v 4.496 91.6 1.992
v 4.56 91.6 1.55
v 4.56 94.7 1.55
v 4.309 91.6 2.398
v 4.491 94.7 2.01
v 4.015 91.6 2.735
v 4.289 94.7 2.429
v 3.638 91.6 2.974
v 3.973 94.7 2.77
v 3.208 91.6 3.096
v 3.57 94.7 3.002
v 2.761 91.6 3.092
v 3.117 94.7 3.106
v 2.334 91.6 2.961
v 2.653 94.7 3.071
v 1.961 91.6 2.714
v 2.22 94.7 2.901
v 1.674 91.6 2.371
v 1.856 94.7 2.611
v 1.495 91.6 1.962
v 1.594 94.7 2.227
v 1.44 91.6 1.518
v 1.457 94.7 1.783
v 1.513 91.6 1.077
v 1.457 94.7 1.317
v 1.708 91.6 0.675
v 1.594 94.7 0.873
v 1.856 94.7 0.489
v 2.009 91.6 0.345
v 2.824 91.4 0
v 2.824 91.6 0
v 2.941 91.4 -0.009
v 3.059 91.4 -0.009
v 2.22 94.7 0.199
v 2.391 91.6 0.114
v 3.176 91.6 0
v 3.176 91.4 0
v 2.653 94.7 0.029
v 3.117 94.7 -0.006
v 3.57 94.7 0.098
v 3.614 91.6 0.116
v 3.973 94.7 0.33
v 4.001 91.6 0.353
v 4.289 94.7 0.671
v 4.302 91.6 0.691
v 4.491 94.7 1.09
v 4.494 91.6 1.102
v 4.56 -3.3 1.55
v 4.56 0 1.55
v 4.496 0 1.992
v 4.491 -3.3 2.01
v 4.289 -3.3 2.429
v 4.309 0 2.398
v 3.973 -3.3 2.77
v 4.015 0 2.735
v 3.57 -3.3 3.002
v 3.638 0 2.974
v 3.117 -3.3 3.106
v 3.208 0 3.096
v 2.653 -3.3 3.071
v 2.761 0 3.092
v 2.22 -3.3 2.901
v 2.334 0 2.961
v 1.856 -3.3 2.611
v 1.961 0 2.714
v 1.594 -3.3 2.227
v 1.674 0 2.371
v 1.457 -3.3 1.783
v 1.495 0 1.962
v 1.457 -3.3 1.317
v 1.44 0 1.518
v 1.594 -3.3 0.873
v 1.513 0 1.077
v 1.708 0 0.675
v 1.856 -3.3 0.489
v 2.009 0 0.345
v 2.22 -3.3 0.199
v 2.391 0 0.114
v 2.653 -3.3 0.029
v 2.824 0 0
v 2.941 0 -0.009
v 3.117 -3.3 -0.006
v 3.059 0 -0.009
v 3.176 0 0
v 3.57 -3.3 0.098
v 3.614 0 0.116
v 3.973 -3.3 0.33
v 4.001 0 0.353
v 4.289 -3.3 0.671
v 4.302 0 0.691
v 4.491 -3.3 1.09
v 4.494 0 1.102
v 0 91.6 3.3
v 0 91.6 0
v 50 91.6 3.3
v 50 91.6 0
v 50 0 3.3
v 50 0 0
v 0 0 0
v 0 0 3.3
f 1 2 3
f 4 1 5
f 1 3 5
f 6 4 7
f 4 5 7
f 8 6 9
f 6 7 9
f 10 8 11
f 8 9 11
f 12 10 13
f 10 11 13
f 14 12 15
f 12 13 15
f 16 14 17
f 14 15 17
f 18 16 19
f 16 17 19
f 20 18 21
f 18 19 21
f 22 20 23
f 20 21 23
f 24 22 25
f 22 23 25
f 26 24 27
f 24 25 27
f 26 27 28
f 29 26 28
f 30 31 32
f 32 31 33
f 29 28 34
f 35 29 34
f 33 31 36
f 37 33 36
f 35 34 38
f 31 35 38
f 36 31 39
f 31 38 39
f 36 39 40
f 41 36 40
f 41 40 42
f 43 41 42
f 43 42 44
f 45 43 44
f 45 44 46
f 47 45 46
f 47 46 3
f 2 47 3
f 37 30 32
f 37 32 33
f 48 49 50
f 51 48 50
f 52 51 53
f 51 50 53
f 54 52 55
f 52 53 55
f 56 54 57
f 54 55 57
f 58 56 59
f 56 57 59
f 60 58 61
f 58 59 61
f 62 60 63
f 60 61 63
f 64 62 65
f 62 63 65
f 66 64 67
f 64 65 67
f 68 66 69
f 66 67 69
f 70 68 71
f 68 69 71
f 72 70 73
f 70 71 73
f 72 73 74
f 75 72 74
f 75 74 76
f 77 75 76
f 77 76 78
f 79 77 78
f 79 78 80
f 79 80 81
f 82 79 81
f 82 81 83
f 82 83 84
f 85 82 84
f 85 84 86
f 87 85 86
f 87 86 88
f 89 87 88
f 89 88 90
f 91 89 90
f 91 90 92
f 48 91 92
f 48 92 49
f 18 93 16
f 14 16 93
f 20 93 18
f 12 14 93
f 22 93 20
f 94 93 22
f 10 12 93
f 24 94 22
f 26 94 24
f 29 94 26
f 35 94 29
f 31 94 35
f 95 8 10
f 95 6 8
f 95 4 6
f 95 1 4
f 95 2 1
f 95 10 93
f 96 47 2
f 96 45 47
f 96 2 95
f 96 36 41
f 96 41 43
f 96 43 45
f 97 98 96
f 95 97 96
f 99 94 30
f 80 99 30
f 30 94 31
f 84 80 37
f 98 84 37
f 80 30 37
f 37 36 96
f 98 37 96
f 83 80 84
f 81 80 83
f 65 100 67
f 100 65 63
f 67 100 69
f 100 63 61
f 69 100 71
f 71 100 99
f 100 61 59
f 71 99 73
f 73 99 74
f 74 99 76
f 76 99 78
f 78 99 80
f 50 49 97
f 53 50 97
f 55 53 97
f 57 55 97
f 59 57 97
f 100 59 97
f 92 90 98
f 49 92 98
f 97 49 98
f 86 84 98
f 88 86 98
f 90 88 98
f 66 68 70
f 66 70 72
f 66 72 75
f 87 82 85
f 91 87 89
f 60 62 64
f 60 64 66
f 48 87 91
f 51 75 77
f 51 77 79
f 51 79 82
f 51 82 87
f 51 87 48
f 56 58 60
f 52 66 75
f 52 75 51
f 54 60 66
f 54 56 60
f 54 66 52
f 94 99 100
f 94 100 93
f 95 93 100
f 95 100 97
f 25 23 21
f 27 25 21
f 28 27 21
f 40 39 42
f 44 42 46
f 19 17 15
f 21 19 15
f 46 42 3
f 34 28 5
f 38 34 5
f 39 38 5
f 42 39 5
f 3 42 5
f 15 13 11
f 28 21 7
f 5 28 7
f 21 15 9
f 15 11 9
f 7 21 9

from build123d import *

# Parameters (mm, degrees)
BOX_W             = 50
BOX_H             = 91.6
BOX_DEPTH         = 3.3
CYLINDER_R        = 1.56
CYLINDER_DEPTH    = 3.3
CYLINDER001_R     = 1.56
CYLINDER001_DEPTH = 3.3


with BuildPart() as part:
    # Box → Box (join)
    with BuildSketch(Plane.XY):
        with Locations((25, 45.8)):
            Rectangle(BOX_W, BOX_H)
    extrude(amount=BOX_DEPTH)

    # Cylinder → Cylinder (join)
    with BuildSketch(Plane(origin=(3, 0, 1.55), x_dir=(1, 0, 0), z_dir=(0, -1, 0))):
        Circle(CYLINDER_R)
    extrude(amount=CYLINDER_DEPTH)

    # Cylinder001 → Cylinder001 (join)
    with BuildSketch(Plane(origin=(3, 94.7, 1.55), x_dir=(1, 0, 0), z_dir=(0, -1, 0))):
        Circle(CYLINDER001_R)
    extrude(amount=CYLINDER001_DEPTH)


solid = part.part
